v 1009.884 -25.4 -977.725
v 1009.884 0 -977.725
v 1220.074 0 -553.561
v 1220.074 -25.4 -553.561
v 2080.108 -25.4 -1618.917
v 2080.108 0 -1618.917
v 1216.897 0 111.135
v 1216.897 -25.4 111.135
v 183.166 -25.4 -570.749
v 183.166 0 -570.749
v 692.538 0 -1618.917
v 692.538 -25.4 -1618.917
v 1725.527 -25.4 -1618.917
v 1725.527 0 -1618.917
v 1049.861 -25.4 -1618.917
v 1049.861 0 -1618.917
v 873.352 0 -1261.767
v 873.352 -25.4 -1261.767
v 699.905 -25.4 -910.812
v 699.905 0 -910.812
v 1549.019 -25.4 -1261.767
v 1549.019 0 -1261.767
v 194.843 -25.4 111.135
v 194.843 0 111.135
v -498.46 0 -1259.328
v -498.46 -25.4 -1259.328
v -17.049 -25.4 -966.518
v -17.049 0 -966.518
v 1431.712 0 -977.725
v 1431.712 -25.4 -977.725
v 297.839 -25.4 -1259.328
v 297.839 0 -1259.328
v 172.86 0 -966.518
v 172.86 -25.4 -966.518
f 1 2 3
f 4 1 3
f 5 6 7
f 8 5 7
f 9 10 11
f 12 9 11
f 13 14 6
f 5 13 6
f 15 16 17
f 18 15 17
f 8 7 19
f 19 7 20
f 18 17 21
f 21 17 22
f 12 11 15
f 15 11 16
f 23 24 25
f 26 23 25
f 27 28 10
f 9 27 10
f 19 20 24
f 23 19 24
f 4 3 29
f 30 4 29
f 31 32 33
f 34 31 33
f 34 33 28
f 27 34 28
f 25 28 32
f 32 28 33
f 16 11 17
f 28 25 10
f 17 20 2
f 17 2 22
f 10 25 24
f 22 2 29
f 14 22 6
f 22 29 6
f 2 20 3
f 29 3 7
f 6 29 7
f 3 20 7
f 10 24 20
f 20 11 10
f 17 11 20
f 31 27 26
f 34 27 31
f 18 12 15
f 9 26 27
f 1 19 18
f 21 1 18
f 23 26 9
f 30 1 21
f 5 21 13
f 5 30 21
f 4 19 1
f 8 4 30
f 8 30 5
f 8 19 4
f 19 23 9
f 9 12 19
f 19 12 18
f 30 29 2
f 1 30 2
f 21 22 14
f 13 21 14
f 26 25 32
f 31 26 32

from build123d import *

# Parameters (mm, degrees)
F1_DEPTH = 25.4


with BuildPart() as f1:
    # F0 (on Front) → F1 (new body)
    with BuildSketch(Plane.XZ):
        Polygon((1216.897011, 111.135446), (699.904772, -910.812122), (873.352215, -1261.767488), (1549.018667, -1261.767488), (1725.527287, -1618.916869), (2080.108166, -1618.916869), align=None)
        Polygon((1009.884238, -977.725396), (1220.074177, -553.560615), (1431.711575, -977.725396), align=None, mode=Mode.SUBTRACT)
        Polygon((699.904772, -910.812122), (194.842845, 111.135446), (-498.459697, -1259.327769), (297.839284, -1259.327769), (172.859624, -966.518342), (-17.048992, -966.518342), (183.166239, -570.749406), (692.537963, -1618.916869), (1049.860835, -1618.916869), (873.352215, -1261.767488), align=None)
    extrude(amount=F1_DEPTH)


solid = f1.part
